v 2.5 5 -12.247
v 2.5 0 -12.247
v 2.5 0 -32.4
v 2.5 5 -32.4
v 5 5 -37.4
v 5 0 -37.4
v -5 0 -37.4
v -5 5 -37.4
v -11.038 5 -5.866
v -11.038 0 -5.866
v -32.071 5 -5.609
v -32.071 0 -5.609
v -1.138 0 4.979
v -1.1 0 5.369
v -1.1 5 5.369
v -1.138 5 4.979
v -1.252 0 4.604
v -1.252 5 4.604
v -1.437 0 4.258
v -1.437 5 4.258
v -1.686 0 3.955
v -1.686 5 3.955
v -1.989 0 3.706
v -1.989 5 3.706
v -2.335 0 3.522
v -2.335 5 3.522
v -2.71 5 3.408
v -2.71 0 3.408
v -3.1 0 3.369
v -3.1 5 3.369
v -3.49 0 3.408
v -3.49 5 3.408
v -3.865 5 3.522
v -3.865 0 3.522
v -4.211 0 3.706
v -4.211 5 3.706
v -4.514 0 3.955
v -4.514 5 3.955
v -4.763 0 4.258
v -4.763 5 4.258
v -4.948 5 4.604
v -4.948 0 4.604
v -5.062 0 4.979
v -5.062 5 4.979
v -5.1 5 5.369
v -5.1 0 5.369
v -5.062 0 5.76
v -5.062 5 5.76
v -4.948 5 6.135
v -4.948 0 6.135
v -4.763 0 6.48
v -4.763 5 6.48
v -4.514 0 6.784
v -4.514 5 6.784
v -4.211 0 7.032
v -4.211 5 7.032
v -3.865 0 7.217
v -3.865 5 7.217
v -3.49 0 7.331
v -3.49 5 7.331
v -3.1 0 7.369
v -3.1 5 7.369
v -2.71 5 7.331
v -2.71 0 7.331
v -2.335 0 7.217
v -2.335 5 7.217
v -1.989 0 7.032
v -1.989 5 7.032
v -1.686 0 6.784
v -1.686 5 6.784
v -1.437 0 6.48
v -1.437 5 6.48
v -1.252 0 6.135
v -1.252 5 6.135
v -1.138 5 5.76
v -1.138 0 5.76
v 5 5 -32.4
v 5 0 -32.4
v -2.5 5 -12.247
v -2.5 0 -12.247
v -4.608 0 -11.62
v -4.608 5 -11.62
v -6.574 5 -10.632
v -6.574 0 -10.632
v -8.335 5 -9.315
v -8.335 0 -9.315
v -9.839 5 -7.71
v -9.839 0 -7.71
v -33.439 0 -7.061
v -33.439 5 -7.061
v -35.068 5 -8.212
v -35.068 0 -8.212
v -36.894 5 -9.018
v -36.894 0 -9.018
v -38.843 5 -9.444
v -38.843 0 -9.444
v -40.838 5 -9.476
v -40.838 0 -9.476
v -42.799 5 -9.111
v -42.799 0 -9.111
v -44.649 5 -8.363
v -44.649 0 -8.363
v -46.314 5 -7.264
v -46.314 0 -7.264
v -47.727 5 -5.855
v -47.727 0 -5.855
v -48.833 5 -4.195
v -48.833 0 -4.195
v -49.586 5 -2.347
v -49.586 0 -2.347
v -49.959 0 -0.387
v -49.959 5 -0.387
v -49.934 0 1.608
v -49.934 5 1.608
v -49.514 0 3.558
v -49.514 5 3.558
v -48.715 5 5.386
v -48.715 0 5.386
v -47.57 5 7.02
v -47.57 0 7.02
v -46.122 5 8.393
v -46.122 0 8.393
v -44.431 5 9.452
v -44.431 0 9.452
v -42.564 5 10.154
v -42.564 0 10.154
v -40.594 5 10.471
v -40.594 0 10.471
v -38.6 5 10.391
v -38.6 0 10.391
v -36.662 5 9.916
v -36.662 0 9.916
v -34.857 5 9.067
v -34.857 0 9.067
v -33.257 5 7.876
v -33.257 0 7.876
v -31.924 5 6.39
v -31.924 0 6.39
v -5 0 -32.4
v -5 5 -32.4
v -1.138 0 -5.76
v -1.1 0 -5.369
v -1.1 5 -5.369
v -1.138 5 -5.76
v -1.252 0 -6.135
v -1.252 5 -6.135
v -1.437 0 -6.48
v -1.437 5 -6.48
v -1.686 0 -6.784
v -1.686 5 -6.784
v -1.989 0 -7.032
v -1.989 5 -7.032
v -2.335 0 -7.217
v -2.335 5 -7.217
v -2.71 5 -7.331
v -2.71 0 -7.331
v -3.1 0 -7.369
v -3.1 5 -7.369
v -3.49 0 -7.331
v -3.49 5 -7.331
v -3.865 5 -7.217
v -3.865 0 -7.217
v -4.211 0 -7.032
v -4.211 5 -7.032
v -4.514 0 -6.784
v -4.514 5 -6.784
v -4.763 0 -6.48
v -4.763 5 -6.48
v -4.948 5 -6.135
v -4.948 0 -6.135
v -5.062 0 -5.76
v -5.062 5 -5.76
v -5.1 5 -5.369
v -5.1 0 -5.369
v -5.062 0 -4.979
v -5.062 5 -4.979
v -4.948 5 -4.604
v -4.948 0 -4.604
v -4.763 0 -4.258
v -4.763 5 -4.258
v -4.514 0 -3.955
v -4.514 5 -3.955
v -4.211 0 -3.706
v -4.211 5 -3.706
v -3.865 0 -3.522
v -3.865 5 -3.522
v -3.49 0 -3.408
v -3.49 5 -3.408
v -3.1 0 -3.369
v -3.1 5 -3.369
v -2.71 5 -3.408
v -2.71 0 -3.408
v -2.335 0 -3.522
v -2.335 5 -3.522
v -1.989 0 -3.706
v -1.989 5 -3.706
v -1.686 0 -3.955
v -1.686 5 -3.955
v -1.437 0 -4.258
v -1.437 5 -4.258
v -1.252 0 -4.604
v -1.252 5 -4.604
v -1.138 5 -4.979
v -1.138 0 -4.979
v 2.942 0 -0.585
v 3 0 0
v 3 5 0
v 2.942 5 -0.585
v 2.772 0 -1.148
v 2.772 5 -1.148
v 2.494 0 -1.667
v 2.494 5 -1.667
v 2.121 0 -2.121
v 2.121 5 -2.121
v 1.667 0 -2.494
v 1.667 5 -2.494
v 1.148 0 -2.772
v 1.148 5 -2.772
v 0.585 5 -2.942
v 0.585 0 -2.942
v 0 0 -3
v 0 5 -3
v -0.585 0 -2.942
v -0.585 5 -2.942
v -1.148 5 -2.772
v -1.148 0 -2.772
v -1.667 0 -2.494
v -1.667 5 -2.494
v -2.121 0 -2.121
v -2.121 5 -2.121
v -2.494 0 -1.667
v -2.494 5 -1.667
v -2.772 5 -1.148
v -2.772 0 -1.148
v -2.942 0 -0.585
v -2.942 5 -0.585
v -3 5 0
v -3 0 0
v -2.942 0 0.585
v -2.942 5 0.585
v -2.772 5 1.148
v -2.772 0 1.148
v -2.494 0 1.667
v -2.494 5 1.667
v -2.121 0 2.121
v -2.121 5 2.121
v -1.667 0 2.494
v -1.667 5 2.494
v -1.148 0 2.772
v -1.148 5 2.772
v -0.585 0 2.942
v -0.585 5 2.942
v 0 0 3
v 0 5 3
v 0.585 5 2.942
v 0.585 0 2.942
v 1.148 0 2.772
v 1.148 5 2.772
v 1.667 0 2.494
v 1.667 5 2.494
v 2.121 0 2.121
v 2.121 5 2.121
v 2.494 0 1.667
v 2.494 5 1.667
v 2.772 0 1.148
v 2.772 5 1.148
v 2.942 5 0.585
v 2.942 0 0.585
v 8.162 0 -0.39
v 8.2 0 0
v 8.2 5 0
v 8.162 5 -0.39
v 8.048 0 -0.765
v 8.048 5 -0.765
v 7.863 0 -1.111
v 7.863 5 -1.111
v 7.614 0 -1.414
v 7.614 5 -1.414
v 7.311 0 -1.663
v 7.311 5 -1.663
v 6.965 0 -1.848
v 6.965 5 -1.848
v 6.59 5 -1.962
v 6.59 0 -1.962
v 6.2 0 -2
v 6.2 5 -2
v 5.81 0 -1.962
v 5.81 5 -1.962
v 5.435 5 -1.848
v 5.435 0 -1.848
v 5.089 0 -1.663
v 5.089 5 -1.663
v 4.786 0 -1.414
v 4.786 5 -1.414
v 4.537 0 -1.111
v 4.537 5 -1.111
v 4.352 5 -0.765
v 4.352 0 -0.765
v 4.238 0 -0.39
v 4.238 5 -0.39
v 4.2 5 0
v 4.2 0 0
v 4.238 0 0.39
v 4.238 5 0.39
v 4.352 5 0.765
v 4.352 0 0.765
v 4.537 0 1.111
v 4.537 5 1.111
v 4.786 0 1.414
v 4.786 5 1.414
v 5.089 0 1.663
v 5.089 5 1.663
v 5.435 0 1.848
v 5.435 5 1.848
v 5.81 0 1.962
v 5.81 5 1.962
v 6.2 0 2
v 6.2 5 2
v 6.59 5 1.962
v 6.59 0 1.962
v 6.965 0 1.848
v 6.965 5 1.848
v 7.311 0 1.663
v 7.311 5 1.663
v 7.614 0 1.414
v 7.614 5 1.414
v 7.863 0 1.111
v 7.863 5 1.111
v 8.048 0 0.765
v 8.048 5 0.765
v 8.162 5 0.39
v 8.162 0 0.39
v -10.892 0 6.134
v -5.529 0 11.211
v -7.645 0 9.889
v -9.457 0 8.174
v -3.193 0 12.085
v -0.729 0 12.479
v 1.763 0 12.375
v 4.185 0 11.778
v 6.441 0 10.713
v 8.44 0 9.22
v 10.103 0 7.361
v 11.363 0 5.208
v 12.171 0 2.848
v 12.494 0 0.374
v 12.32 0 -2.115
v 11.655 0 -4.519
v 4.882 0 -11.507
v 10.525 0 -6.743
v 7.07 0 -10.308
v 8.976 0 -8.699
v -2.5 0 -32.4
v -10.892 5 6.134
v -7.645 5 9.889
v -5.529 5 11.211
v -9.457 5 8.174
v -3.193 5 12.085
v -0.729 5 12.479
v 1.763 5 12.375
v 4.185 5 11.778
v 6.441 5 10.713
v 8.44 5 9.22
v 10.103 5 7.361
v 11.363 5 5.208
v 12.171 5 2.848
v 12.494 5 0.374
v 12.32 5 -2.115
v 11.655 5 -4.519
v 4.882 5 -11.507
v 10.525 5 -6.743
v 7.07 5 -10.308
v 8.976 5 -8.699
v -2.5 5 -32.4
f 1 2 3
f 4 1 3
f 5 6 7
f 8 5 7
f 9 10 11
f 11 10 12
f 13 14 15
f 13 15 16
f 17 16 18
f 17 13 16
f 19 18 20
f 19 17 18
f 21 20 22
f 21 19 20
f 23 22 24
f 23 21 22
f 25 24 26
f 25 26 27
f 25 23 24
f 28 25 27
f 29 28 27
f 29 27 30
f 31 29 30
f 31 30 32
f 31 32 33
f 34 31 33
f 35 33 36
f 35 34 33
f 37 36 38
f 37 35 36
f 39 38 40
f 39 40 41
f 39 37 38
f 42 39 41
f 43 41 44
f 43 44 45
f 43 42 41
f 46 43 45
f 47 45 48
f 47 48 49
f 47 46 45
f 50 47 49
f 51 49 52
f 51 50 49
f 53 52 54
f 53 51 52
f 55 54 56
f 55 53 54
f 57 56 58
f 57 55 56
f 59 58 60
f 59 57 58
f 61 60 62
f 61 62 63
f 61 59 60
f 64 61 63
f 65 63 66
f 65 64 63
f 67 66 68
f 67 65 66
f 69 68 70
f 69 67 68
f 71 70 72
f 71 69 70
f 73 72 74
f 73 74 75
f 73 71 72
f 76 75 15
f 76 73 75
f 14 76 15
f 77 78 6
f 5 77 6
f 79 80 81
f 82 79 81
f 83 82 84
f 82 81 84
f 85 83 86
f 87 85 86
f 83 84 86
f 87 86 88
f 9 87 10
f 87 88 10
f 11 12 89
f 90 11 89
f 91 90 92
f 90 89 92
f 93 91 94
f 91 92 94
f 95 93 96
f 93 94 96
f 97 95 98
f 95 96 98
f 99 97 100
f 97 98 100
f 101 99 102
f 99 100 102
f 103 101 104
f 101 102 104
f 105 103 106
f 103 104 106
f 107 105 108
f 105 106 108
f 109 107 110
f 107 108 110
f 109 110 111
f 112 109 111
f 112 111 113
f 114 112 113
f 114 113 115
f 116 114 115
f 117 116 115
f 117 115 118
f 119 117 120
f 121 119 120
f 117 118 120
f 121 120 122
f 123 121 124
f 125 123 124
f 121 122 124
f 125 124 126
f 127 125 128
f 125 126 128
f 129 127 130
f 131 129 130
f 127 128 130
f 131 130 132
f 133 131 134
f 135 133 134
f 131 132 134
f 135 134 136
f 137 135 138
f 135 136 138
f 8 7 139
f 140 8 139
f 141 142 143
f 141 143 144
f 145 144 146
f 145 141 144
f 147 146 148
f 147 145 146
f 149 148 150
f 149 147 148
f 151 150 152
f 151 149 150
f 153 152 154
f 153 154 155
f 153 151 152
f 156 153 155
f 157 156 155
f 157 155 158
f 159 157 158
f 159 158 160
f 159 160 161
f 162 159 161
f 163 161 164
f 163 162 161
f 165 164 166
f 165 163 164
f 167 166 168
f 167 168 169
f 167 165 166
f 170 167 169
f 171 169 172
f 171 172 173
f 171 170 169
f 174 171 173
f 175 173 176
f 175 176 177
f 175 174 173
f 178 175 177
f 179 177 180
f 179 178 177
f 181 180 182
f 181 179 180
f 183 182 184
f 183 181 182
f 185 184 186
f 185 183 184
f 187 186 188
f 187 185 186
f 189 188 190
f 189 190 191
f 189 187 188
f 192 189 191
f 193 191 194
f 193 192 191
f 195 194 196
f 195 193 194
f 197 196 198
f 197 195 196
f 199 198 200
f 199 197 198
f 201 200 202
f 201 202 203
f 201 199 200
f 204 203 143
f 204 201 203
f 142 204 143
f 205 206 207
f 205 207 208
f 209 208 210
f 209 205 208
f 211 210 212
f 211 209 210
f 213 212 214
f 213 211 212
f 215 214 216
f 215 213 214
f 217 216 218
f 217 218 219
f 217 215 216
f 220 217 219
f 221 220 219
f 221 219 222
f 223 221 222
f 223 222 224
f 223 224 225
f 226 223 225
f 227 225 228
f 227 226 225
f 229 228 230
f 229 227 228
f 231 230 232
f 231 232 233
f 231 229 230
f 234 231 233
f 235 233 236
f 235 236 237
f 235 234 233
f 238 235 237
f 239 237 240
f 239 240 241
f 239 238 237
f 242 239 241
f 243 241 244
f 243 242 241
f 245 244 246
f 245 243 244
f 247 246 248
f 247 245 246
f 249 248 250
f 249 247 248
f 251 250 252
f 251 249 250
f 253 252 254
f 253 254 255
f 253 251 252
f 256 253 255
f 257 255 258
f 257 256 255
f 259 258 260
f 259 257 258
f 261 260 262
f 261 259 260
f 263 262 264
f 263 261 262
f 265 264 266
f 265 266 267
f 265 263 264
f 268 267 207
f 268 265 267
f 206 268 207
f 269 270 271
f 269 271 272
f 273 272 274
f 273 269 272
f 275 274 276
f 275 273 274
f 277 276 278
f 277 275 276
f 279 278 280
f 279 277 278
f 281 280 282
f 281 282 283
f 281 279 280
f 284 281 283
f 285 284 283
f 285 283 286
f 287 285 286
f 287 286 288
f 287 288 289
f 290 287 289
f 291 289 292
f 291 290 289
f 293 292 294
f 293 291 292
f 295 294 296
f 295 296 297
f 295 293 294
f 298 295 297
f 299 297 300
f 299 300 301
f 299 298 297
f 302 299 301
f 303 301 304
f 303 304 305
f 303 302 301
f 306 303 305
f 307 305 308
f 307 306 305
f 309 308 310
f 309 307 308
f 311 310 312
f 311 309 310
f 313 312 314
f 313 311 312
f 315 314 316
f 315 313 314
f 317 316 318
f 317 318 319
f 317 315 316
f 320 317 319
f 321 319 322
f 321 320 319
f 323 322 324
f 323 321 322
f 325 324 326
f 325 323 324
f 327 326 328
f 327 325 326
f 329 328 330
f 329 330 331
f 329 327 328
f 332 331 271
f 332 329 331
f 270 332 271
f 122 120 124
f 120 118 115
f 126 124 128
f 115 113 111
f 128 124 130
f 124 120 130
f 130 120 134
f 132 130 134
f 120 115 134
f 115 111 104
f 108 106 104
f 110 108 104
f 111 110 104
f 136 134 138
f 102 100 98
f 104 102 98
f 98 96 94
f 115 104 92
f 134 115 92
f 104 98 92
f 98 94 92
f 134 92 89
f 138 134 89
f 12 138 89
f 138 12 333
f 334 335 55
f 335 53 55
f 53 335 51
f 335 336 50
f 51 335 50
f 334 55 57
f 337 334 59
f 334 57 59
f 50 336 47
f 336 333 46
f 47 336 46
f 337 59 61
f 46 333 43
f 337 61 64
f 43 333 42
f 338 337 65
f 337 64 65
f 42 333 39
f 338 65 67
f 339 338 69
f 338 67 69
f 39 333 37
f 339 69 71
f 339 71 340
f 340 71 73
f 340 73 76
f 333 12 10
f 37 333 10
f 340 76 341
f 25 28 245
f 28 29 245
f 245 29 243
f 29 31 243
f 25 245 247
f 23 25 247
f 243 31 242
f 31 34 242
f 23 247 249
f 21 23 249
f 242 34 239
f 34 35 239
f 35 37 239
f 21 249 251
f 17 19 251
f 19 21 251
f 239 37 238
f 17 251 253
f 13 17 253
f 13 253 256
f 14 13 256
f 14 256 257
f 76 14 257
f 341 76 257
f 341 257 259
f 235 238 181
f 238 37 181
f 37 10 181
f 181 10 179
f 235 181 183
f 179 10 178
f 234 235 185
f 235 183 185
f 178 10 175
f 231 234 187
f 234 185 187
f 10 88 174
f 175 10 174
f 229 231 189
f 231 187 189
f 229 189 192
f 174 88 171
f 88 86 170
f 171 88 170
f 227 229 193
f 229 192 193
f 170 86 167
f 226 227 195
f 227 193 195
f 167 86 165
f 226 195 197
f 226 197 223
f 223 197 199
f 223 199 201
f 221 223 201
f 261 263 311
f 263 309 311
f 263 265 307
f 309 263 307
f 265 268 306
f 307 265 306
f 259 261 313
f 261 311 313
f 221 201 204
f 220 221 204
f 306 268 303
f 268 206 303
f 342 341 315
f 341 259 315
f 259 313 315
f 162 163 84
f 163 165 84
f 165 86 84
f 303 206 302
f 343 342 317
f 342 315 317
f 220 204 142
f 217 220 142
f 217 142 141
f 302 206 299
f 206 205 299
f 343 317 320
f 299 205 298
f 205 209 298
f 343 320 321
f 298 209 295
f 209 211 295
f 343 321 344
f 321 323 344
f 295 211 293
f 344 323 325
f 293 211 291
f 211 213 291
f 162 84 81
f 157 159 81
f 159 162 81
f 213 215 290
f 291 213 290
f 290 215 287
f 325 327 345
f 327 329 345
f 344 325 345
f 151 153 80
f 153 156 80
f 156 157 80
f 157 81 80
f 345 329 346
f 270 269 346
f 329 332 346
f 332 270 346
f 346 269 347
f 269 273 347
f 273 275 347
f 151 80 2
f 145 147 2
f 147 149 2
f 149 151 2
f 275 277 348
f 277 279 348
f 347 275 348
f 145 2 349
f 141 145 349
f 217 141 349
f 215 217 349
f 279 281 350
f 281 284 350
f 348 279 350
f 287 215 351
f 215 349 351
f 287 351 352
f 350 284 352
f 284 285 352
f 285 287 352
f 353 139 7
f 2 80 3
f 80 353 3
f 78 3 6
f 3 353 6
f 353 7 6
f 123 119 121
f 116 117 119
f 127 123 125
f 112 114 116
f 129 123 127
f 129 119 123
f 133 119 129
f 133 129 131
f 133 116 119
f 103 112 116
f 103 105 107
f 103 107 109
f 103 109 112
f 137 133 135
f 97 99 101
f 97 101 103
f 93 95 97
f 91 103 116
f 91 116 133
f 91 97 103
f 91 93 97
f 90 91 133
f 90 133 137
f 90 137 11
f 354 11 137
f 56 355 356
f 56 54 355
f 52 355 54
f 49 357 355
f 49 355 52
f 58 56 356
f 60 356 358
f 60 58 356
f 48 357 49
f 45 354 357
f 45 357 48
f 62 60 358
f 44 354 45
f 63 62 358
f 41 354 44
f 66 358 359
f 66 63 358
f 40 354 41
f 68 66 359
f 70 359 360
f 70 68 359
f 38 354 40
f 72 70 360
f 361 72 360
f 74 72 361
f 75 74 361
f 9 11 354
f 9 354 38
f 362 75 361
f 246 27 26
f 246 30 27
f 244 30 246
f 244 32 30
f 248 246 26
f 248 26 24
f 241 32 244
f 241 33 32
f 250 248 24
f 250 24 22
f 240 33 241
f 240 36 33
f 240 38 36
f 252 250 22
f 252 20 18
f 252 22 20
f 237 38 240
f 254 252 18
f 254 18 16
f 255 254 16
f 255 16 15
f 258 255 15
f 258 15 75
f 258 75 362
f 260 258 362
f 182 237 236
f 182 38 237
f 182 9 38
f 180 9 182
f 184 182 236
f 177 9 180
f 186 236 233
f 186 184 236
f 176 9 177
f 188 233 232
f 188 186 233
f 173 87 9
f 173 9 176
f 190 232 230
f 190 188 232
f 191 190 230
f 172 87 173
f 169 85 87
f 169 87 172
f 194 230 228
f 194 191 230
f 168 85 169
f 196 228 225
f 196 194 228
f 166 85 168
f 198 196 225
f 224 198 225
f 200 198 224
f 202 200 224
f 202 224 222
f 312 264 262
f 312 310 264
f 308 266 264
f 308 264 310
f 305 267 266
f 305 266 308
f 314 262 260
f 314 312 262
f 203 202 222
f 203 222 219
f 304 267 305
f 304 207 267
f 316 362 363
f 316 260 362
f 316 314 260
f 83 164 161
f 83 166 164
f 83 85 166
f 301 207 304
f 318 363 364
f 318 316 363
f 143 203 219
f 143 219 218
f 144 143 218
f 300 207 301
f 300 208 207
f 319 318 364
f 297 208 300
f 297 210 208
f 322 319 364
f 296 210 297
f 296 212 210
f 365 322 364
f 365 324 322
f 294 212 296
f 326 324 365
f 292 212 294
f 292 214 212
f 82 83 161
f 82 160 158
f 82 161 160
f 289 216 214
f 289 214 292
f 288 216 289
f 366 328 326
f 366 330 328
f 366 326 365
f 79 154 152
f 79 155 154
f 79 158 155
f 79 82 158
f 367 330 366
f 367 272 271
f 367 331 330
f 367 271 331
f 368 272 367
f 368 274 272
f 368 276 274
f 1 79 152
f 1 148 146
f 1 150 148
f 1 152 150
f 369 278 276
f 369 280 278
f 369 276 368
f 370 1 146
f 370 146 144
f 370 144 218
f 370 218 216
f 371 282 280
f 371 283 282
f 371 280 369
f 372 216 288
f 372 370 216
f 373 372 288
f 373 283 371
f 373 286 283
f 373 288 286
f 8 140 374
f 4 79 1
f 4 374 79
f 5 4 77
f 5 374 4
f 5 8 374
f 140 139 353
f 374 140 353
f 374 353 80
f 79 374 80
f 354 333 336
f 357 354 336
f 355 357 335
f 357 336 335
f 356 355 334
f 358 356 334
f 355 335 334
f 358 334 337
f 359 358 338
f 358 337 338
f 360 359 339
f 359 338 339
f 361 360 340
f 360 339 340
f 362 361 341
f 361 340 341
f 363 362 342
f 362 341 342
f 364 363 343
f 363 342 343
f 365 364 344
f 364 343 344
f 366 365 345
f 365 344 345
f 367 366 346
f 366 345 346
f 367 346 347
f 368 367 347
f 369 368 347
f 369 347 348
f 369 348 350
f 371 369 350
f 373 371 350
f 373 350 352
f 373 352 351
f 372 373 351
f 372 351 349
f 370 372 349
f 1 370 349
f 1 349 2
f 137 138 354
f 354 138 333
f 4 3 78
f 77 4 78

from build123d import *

# Parameters (mm, degrees)
SKETCH1_R           = 2
SKETCH1_R_2         = 3
BOSS_EXTRUDE1_DEPTH = 5


with BuildPart() as part:
    # Sketch1 → Boss-Extrude1 (new body)
    with BuildSketch(Plane(origin=(0, 0, 0), x_dir=(1, 0, 0), z_dir=(0, 1, 0))):
        with BuildLine():
            Line((-31.924309824, -6.390496245), (-10.891735709, -6.133522091))
            ThreePointArc((-10.891735709, -6.133522091), (10.102986142, -7.36068414), (2.5, 12.247448714))
            Line((2.5, 12.247448714), (2.5, 32.4))
            Line((2.5, 32.4), (5, 32.4))
            Line((5, 32.4), (5, 37.4))
            Line((5, 37.4), (-5, 37.4))
            Line((-5, 37.4), (-5, 32.4))
            Line((-5, 32.4), (-2.5, 32.4))
            Line((-2.5, 32.4), (-2.5, 12.247448714))
            ThreePointArc((-2.5, 12.247448714), (-7.483563, 10.012306668), (-11.038339719, 5.865582345))
            Line((-11.038339719, 5.865582345), (-32.070913834, 5.608608191))
            ThreePointArc((-32.070913834, 5.608608191), (-49.996268483, -0.610850042), (-31.924309824, -6.390496245))
        make_face()
        with Locations((6.2, 0)):
            Circle(SKETCH1_R, mode=Mode.SUBTRACT)
        with Locations((-3.1, -5.369357503)):
            Circle(SKETCH1_R, mode=Mode.SUBTRACT)
        Circle(SKETCH1_R_2, mode=Mode.SUBTRACT)
        with Locations((-3.1, 5.369357503)):
            Circle(SKETCH1_R, mode=Mode.SUBTRACT)
    extrude(amount=BOSS_EXTRUDE1_DEPTH)


solid = part.part
